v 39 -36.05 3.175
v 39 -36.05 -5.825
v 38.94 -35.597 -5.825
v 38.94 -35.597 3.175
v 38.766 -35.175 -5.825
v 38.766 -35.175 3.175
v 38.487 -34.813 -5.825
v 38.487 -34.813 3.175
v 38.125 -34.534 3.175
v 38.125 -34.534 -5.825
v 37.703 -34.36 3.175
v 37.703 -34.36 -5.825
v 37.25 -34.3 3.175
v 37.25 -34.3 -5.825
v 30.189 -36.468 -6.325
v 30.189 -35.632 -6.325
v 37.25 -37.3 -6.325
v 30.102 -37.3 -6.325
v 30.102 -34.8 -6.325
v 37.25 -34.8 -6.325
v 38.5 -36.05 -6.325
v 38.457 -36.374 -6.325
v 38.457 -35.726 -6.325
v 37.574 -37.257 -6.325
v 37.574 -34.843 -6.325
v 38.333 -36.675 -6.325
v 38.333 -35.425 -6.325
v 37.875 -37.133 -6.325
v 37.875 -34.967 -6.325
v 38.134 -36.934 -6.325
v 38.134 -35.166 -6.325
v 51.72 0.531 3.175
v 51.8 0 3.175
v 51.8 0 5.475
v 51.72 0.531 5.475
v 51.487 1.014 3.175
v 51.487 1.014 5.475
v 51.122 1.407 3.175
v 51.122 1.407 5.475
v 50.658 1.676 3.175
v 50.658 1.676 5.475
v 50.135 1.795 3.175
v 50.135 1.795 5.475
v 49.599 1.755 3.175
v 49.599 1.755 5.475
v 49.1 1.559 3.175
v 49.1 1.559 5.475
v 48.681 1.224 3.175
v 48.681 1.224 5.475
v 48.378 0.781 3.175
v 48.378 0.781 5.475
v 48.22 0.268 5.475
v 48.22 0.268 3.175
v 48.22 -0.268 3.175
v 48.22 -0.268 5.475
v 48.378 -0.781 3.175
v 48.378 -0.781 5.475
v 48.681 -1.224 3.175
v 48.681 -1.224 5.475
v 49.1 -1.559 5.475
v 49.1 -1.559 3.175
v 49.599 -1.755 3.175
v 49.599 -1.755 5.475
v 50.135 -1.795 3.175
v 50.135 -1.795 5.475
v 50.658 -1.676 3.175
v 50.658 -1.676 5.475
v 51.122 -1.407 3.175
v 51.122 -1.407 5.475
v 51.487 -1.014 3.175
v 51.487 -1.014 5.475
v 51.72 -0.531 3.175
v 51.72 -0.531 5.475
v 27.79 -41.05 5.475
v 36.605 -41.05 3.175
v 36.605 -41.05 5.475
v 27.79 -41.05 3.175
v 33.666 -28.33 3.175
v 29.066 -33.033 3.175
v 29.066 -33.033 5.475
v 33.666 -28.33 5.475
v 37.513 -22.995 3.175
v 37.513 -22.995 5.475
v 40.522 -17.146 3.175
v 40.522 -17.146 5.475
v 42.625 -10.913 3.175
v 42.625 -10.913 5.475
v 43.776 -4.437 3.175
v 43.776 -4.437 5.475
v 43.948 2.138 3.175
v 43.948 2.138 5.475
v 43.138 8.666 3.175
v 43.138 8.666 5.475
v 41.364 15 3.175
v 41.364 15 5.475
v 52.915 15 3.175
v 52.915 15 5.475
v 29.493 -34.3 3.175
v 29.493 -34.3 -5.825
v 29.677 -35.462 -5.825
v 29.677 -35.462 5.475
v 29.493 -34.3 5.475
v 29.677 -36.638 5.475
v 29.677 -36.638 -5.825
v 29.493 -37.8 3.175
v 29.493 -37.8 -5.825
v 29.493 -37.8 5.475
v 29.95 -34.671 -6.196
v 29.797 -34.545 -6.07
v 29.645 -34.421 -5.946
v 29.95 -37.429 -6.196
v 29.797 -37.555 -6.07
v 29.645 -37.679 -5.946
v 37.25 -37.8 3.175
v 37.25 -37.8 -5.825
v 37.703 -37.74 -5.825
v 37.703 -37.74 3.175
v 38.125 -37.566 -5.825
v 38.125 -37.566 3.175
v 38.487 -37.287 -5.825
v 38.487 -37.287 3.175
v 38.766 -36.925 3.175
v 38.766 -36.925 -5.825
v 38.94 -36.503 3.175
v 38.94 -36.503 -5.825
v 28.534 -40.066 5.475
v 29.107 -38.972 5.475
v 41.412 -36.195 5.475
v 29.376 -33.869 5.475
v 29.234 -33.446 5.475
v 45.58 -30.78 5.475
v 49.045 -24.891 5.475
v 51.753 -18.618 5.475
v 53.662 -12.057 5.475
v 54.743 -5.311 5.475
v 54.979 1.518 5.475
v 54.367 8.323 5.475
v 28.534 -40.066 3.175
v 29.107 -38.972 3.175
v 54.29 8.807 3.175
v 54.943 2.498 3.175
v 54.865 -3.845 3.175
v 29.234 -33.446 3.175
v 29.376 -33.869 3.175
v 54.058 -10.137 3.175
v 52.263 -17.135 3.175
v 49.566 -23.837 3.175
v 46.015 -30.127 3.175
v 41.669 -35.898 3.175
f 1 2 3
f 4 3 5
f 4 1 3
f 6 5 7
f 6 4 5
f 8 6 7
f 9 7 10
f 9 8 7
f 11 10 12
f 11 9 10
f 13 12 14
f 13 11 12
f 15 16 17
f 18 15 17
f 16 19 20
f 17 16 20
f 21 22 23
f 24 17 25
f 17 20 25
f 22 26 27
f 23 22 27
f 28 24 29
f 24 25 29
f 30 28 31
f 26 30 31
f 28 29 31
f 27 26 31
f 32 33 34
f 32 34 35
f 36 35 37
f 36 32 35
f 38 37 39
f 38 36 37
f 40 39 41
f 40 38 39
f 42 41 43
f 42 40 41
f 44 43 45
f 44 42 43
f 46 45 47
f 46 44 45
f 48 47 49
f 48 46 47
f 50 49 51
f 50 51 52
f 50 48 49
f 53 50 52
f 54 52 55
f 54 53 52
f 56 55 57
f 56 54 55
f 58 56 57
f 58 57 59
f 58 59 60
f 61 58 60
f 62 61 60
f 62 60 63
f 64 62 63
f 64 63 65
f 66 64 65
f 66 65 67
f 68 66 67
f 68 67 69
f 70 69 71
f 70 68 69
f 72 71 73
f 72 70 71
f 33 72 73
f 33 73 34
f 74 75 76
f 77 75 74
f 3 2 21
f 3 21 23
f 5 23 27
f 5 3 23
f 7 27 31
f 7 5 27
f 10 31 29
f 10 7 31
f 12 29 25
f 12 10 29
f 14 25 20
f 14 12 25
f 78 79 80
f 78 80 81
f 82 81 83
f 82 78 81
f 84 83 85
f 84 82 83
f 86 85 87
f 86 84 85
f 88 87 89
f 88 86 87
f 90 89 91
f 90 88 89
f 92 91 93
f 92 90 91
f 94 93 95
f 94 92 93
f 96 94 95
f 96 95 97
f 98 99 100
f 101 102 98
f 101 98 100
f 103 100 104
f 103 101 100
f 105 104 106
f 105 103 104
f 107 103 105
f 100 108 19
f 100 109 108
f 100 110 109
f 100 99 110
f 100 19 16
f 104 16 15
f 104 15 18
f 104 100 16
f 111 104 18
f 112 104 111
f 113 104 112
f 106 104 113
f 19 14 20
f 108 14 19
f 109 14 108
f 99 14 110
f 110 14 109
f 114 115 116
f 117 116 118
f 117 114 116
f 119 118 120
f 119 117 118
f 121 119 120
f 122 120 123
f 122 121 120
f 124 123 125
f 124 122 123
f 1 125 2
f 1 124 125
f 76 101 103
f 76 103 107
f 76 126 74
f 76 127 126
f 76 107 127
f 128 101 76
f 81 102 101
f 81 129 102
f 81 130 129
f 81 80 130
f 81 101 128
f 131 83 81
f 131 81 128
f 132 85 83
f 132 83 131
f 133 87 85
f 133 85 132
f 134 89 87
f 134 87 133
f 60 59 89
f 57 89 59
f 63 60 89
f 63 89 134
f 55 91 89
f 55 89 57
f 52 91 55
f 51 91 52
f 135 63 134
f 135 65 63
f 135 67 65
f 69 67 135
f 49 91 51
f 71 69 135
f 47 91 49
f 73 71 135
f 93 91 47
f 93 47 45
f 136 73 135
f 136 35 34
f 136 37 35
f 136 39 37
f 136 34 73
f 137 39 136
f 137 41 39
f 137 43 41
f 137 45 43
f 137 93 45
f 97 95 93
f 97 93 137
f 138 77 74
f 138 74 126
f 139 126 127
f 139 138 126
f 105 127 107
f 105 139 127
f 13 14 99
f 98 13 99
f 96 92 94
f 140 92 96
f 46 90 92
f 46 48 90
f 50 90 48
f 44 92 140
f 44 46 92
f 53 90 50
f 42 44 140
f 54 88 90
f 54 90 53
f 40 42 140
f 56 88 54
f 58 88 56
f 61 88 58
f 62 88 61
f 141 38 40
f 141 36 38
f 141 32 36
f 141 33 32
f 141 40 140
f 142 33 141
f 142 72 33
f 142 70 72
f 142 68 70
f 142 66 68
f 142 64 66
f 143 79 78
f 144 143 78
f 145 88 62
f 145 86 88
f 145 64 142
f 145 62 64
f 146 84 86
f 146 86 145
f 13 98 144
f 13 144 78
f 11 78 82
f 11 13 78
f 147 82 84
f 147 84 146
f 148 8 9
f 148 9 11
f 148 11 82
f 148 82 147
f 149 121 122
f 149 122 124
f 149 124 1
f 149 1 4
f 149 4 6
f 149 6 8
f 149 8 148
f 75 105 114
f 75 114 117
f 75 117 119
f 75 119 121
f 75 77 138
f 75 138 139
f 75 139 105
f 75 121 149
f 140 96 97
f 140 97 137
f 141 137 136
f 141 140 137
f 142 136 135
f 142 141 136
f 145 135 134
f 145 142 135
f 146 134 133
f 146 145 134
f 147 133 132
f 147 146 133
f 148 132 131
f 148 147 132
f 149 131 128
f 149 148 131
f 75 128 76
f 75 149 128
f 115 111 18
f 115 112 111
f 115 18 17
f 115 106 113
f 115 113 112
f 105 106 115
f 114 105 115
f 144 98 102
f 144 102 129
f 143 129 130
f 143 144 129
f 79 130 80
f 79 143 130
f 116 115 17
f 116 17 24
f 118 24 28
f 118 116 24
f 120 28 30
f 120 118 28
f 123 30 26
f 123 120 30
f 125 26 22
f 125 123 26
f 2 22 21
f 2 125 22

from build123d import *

# Parameters (mm, degrees)
SKETCH1_R                = 2.150000002
SKETCH1_R_2              = 35
SKETCH1_R_3              = 1.8
SKETCH1_R_4              = 7.575
BOSS_EXTRUDE1_DEPTH      = 3.175
SKETCH3_R                = 1.35
SKETCH3_R_2              = 5
SKETCH3_W                = 18
SKETCH3_H                = 3.5
CUT_EXTRUDE1_DEPTH       = 3.175
CUT_EXTRUDE2_DEPTH       = 3.175
SKETCH6_R                = 7.5
CUT_EXTRUDE5_DEPTH       = 10
FILLET1_R                = 1.75
SKETCH7_R                = 1.75
CUT_EXTRUDE6_DEPTH       = 10
SKETCH10_R               = 1.8
BOSS_EXTRUDE2_DEPTH      = 2.3
CUT_EXTRUDE7_DEPTH       = 118.49445714
CUT_EXTRUDE7_DEPTH_BACK  = 118.49445714
SKETCH11_W               = 179.014242855
SKETCH11_H               = 40.200555742
BOSS_EXTRUDE3_DEPTH      = 9.5
BOSS_EXTRUDE3_DEPTH_BACK = 2.3
CHAMFER1_SIZE            = 0.5


with BuildPart() as part:
    # Sketch1 → Boss-Extrude1 (new body)
    with BuildSketch(Plane.XY):
        with BuildLine():
            Line((69.097259206, -18.820036388), (54.057762213, -10.136978751))
            ThreePointArc((54.057762213, -10.136978751), (47.631397163, 27.499999965), (18.250000006, 51.883884719))
            Line((18.250000006, 51.883884719), (18.250000006, 69.249999994))
            ThreePointArc((18.250000006, 69.249999994), (6e-09, 87.499999994), (-18.249999994, 69.249999994))
            Line((-18.249999994, 69.249999994), (-18.249999994, 51.883884717))
            ThreePointArc((-18.249999994, 51.883884717), (-47.836716311, 27.141270525), (-53.899300523, -10.948305635))
            Line((-53.899300523, -10.948305635), (-69.097259204, -18.820036383))
            ThreePointArc((-69.097259204, -18.820036383), (-77.600405532, -29.901552426), (-75.777222821, -43.749999994))
            ThreePointArc((-75.777222821, -43.749999994), (0, -87.499999989), (75.777222821, -43.749999994))
            ThreePointArc((75.777222821, -43.749999994), (77.60040553, -29.901552429), (69.097259206, -18.820036388))
        make_face()
        with Locations((-7.778174593, 77.028174587)):
            Circle(SKETCH1_R, mode=Mode.SUBTRACT)
        Circle(SKETCH1_R_2, mode=Mode.SUBTRACT)
        with Locations((-50, 0)):
            Circle(SKETCH1_R_3, mode=Mode.SUBTRACT)
        with Locations((-25, 43.301270189)):
            Circle(SKETCH1_R_3, mode=Mode.SUBTRACT)
        with Locations((25, 43.301270189)):
            Circle(SKETCH1_R_3, mode=Mode.SUBTRACT)
        with Locations((50, 0)):
            Circle(SKETCH1_R_3, mode=Mode.SUBTRACT)
        with Locations((25, -43.301270189)):
            Circle(SKETCH1_R_3, mode=Mode.SUBTRACT)
        with Locations((-25, -43.301270189)):
            Circle(SKETCH1_R_3, mode=Mode.SUBTRACT)
        with Locations((7.778174587, 77.028174593)):
            Circle(SKETCH1_R, mode=Mode.SUBTRACT)
        with Locations((7.778174593, 61.471825413)):
            Circle(SKETCH1_R, mode=Mode.SUBTRACT)
        with Locations((-7.778174587, 61.471825407)):
            Circle(SKETCH1_R, mode=Mode.SUBTRACT)
        with Locations((62.819268711, -45.250184084)):
            Circle(SKETCH1_R, mode=Mode.SUBTRACT)
        with Locations((49.347075128, -37.472009499)):
            Circle(SKETCH1_R, mode=Mode.SUBTRACT)
        with Locations((57.125249713, -23.999815916)):
            Circle(SKETCH1_R, mode=Mode.SUBTRACT)
        with Locations((70.597443296, -31.777990501)):
            Circle(SKETCH1_R, mode=Mode.SUBTRACT)
        with Locations((-70.597443298, -31.777990509)):
            Circle(SKETCH1_R, mode=Mode.SUBTRACT)
        with Locations((-57.125249721, -23.999815914)):
            Circle(SKETCH1_R, mode=Mode.SUBTRACT)
        with Locations((-49.347075126, -37.472009491)):
            Circle(SKETCH1_R, mode=Mode.SUBTRACT)
        with Locations((-62.819268703, -45.250184086)):
            Circle(SKETCH1_R, mode=Mode.SUBTRACT)
        with Locations((0, 69.249999994)):
            Circle(SKETCH1_R_4, mode=Mode.SUBTRACT)
        with Locations((59.972259207, -34.624999997)):
            Circle(SKETCH1_R_4, mode=Mode.SUBTRACT)
        with Locations((-59.972259207, -34.624999997)):
            Circle(SKETCH1_R_4, mode=Mode.SUBTRACT)
    extrude(amount=BOSS_EXTRUDE1_DEPTH)

    # Sketch3 → Cut-Extrude1 (cut)
    with BuildSketch(Plane.XY.offset(3.175)):
        with Locations((-33.85, -49)):
            Circle(SKETCH3_R)
        with Locations((-33.85, -75)):
            Circle(SKETCH3_R)
        with Locations((41.45, -46.7)):
            Circle(SKETCH3_R)
        with Locations((49.972259207, -51.945508073)):
            Circle(SKETCH3_R_2)
        with Locations((48.55, -69)):
            Circle(SKETCH3_R)
        with Locations((30, -36.05)):
            Rectangle(SKETCH3_W, SKETCH3_H)
    extrude(amount=-CUT_EXTRUDE1_DEPTH, mode=Mode.SUBTRACT)

    # Sketch4 → Cut-Extrude2 (cut)
    with BuildSketch(Plane.XY.offset(3.175)):
        Polygon((-18.902035191, 65.231994187), (-24.642286676, 79.090187175), (-38.500479664, 73.349935689), (-32.760228178, 59.491742702), align=None)
        Polygon((-47.04154651, -48.985639752), (-56.172967945, -60.885939856), (-63.507557332, -70.444562845), (-51.607257228, -79.57598428), (-44.272667841, -70.017361292), (-35.141246406, -58.117061187), align=None)
        Polygon((65.943581701, -16.246354435), (80.815254622, -18.204247318), (82.773147505, -3.332574398), (67.901474584, -1.374681515), align=None)
    extrude(amount=-CUT_EXTRUDE2_DEPTH, mode=Mode.SUBTRACT)

    # Sketch6 → Cut-Extrude5 (cut)
    with BuildSketch(Plane.XY):
        with Locations((20, 69.25)):
            Circle(SKETCH6_R)
        with Locations((-69.972259212, -17.304491924)):
            Circle(SKETCH6_R)
    extrude(amount=CUT_EXTRUDE5_DEPTH, mode=Mode.SUBTRACT)

    # Fillet1
    fillet1_edges = [part.edges().sort_by_distance(p)[0] for p in [
        (21, -37.8, 1.5875),
        (39, -37.8, 1.5875),
        (39, -34.3, 1.5875),
        (21, -34.3, 1.5875),
    ]]
    fillet(fillet1_edges, radius=FILLET1_R - 0.0001)  # a hair under: the kernel refuses the full size

    # Sketch7 → Cut-Extrude6 (cut)
    with BuildSketch(Plane.XY.offset(3.175)):
        with Locations((-43, 10)):
            Circle(SKETCH7_R)
        with Locations((-43, -10)):
            Circle(SKETCH7_R)
    extrude(amount=-CUT_EXTRUDE6_DEPTH, mode=Mode.SUBTRACT)

    # Sketch10 → Boss-Extrude2 (add)
    with BuildSketch(Plane.XY.offset(3.175)):
        with BuildLine():
            Line((29.492976073, -37.8), (37.25, -37.8))
            ThreePointArc((37.25, -37.8), (38.487436867, -37.287436867), (39, -36.05))
            ThreePointArc((39, -36.05), (38.487436867, -34.812563133), (37.25, -34.3))
            Line((37.25, -34.3), (29.492976073, -34.3))
            ThreePointArc((29.492976073, -34.3), (29.307916131, -33.656774505), (29.066247328, -33.032609135))
            ThreePointArc((29.066247328, -33.032609135), (42.625064482, -10.913472313), (41.36423576, 15))
            Line((41.36423576, 15), (52.915026221, 15))
            ThreePointArc((52.915026221, 15), (52.809487392, -15.367434443), (36.604610365, -41.05))
            Line((36.604610365, -41.05), (27.790169944, -41.05))
            ThreePointArc((27.790169944, -41.05), (28.843379247, -39.530734431), (29.492976073, -37.8))
        make_face()
        with Locations((50, 0)):
            Circle(SKETCH10_R, mode=Mode.SUBTRACT)
    extrude(amount=BOSS_EXTRUDE2_DEPTH)

    # Sketch11 → Cut-Extrude7 (cut, two sides: drawn at the far end of the back side and taken through both)
    with BuildSketch(Plane(origin=(0, 0, 0), x_dir=(1, 0, 0), z_dir=(0, 1, 0)).offset(-CUT_EXTRUDE7_DEPTH_BACK)):
        with Locations((-6.278377224, 16.925277871)):
            Rectangle(SKETCH11_W, SKETCH11_H)
    extrude(amount=CUT_EXTRUDE7_DEPTH + CUT_EXTRUDE7_DEPTH_BACK, mode=Mode.SUBTRACT)

    # Sketch12 → Boss-Extrude3 (add, two sides: drawn at the far end of the back side and taken through both)
    with BuildSketch(Plane(origin=(0, 0, 3.175), x_dir=(-1, 0, 0), z_dir=(0, 0, -1)).offset(-BOSS_EXTRUDE3_DEPTH_BACK)):
        with BuildLine():
            Line((-29.492976073, -37.8), (-37.25, -37.8))
            ThreePointArc((-37.25, -37.8), (-38.487436867, -37.287436867), (-39, -36.05))
            ThreePointArc((-39, -36.05), (-38.487436867, -34.812563133), (-37.25, -34.3))
            Line((-37.25, -34.3), (-29.492976073, -34.3))
            ThreePointArc((-29.492976073, -34.3), (-29.7, -36.05), (-29.492976073, -37.8))
        make_face()
    extrude(amount=BOSS_EXTRUDE3_DEPTH + BOSS_EXTRUDE3_DEPTH_BACK)

    # Chamfer1
    chamfer1_edges = [part.edges().sort_by_distance(p)[0] for p in [
        (29.7, -36.05, -6.325),
        (33.371488036, -34.3, -6.325),
        (39, -36.05, -6.325),
        (33.371488036, -37.8, -6.325),
    ]]
    chamfer(chamfer1_edges, length=CHAMFER1_SIZE)


solid = part.part
